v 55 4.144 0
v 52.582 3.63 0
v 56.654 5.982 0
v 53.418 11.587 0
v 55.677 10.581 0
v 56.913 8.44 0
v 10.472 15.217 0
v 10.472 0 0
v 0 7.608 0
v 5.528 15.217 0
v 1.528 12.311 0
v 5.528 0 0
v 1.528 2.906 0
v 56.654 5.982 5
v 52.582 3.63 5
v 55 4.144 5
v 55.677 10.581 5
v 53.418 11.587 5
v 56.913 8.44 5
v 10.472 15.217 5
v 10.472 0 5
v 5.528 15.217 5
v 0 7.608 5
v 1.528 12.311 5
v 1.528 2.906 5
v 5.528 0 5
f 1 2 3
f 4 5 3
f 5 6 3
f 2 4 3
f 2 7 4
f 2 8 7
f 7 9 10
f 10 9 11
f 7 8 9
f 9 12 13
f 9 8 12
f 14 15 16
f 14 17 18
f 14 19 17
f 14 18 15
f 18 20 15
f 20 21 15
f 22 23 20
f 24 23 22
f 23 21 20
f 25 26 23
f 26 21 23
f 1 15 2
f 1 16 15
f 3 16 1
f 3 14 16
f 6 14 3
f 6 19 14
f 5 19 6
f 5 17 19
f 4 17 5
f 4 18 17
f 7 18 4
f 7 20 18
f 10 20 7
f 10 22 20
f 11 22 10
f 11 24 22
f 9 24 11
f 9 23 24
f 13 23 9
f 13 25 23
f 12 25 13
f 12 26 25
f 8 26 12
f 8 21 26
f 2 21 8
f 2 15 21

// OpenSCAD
$fn = 32;

// ----------------------------------------------------------------------
// Lever arm: two bosses 16 and 8 mm, 45 mm between centres
// ----------------------------------------------------------------------

// --- parameters (mm) ---
profile_height = 5;       // extrusion height
profile_points = 13;      // points of the closed outline

profile = [[0, 7.608], [1.528, 2.906], [5.528, 0], [10.472, 0], [52.582, 3.63], [55, 4.144], [56.654, 5.982], [56.913, 8.44], [55.677, 10.581], [53.418, 11.587], [10.472, 15.217], [5.528, 15.217], [1.528, 12.311]];  // single closed polygon, 13 points, counter clockwise

// --- the one profile operation ---
linear_extrude(height = profile_height) polygon(points = profile);
